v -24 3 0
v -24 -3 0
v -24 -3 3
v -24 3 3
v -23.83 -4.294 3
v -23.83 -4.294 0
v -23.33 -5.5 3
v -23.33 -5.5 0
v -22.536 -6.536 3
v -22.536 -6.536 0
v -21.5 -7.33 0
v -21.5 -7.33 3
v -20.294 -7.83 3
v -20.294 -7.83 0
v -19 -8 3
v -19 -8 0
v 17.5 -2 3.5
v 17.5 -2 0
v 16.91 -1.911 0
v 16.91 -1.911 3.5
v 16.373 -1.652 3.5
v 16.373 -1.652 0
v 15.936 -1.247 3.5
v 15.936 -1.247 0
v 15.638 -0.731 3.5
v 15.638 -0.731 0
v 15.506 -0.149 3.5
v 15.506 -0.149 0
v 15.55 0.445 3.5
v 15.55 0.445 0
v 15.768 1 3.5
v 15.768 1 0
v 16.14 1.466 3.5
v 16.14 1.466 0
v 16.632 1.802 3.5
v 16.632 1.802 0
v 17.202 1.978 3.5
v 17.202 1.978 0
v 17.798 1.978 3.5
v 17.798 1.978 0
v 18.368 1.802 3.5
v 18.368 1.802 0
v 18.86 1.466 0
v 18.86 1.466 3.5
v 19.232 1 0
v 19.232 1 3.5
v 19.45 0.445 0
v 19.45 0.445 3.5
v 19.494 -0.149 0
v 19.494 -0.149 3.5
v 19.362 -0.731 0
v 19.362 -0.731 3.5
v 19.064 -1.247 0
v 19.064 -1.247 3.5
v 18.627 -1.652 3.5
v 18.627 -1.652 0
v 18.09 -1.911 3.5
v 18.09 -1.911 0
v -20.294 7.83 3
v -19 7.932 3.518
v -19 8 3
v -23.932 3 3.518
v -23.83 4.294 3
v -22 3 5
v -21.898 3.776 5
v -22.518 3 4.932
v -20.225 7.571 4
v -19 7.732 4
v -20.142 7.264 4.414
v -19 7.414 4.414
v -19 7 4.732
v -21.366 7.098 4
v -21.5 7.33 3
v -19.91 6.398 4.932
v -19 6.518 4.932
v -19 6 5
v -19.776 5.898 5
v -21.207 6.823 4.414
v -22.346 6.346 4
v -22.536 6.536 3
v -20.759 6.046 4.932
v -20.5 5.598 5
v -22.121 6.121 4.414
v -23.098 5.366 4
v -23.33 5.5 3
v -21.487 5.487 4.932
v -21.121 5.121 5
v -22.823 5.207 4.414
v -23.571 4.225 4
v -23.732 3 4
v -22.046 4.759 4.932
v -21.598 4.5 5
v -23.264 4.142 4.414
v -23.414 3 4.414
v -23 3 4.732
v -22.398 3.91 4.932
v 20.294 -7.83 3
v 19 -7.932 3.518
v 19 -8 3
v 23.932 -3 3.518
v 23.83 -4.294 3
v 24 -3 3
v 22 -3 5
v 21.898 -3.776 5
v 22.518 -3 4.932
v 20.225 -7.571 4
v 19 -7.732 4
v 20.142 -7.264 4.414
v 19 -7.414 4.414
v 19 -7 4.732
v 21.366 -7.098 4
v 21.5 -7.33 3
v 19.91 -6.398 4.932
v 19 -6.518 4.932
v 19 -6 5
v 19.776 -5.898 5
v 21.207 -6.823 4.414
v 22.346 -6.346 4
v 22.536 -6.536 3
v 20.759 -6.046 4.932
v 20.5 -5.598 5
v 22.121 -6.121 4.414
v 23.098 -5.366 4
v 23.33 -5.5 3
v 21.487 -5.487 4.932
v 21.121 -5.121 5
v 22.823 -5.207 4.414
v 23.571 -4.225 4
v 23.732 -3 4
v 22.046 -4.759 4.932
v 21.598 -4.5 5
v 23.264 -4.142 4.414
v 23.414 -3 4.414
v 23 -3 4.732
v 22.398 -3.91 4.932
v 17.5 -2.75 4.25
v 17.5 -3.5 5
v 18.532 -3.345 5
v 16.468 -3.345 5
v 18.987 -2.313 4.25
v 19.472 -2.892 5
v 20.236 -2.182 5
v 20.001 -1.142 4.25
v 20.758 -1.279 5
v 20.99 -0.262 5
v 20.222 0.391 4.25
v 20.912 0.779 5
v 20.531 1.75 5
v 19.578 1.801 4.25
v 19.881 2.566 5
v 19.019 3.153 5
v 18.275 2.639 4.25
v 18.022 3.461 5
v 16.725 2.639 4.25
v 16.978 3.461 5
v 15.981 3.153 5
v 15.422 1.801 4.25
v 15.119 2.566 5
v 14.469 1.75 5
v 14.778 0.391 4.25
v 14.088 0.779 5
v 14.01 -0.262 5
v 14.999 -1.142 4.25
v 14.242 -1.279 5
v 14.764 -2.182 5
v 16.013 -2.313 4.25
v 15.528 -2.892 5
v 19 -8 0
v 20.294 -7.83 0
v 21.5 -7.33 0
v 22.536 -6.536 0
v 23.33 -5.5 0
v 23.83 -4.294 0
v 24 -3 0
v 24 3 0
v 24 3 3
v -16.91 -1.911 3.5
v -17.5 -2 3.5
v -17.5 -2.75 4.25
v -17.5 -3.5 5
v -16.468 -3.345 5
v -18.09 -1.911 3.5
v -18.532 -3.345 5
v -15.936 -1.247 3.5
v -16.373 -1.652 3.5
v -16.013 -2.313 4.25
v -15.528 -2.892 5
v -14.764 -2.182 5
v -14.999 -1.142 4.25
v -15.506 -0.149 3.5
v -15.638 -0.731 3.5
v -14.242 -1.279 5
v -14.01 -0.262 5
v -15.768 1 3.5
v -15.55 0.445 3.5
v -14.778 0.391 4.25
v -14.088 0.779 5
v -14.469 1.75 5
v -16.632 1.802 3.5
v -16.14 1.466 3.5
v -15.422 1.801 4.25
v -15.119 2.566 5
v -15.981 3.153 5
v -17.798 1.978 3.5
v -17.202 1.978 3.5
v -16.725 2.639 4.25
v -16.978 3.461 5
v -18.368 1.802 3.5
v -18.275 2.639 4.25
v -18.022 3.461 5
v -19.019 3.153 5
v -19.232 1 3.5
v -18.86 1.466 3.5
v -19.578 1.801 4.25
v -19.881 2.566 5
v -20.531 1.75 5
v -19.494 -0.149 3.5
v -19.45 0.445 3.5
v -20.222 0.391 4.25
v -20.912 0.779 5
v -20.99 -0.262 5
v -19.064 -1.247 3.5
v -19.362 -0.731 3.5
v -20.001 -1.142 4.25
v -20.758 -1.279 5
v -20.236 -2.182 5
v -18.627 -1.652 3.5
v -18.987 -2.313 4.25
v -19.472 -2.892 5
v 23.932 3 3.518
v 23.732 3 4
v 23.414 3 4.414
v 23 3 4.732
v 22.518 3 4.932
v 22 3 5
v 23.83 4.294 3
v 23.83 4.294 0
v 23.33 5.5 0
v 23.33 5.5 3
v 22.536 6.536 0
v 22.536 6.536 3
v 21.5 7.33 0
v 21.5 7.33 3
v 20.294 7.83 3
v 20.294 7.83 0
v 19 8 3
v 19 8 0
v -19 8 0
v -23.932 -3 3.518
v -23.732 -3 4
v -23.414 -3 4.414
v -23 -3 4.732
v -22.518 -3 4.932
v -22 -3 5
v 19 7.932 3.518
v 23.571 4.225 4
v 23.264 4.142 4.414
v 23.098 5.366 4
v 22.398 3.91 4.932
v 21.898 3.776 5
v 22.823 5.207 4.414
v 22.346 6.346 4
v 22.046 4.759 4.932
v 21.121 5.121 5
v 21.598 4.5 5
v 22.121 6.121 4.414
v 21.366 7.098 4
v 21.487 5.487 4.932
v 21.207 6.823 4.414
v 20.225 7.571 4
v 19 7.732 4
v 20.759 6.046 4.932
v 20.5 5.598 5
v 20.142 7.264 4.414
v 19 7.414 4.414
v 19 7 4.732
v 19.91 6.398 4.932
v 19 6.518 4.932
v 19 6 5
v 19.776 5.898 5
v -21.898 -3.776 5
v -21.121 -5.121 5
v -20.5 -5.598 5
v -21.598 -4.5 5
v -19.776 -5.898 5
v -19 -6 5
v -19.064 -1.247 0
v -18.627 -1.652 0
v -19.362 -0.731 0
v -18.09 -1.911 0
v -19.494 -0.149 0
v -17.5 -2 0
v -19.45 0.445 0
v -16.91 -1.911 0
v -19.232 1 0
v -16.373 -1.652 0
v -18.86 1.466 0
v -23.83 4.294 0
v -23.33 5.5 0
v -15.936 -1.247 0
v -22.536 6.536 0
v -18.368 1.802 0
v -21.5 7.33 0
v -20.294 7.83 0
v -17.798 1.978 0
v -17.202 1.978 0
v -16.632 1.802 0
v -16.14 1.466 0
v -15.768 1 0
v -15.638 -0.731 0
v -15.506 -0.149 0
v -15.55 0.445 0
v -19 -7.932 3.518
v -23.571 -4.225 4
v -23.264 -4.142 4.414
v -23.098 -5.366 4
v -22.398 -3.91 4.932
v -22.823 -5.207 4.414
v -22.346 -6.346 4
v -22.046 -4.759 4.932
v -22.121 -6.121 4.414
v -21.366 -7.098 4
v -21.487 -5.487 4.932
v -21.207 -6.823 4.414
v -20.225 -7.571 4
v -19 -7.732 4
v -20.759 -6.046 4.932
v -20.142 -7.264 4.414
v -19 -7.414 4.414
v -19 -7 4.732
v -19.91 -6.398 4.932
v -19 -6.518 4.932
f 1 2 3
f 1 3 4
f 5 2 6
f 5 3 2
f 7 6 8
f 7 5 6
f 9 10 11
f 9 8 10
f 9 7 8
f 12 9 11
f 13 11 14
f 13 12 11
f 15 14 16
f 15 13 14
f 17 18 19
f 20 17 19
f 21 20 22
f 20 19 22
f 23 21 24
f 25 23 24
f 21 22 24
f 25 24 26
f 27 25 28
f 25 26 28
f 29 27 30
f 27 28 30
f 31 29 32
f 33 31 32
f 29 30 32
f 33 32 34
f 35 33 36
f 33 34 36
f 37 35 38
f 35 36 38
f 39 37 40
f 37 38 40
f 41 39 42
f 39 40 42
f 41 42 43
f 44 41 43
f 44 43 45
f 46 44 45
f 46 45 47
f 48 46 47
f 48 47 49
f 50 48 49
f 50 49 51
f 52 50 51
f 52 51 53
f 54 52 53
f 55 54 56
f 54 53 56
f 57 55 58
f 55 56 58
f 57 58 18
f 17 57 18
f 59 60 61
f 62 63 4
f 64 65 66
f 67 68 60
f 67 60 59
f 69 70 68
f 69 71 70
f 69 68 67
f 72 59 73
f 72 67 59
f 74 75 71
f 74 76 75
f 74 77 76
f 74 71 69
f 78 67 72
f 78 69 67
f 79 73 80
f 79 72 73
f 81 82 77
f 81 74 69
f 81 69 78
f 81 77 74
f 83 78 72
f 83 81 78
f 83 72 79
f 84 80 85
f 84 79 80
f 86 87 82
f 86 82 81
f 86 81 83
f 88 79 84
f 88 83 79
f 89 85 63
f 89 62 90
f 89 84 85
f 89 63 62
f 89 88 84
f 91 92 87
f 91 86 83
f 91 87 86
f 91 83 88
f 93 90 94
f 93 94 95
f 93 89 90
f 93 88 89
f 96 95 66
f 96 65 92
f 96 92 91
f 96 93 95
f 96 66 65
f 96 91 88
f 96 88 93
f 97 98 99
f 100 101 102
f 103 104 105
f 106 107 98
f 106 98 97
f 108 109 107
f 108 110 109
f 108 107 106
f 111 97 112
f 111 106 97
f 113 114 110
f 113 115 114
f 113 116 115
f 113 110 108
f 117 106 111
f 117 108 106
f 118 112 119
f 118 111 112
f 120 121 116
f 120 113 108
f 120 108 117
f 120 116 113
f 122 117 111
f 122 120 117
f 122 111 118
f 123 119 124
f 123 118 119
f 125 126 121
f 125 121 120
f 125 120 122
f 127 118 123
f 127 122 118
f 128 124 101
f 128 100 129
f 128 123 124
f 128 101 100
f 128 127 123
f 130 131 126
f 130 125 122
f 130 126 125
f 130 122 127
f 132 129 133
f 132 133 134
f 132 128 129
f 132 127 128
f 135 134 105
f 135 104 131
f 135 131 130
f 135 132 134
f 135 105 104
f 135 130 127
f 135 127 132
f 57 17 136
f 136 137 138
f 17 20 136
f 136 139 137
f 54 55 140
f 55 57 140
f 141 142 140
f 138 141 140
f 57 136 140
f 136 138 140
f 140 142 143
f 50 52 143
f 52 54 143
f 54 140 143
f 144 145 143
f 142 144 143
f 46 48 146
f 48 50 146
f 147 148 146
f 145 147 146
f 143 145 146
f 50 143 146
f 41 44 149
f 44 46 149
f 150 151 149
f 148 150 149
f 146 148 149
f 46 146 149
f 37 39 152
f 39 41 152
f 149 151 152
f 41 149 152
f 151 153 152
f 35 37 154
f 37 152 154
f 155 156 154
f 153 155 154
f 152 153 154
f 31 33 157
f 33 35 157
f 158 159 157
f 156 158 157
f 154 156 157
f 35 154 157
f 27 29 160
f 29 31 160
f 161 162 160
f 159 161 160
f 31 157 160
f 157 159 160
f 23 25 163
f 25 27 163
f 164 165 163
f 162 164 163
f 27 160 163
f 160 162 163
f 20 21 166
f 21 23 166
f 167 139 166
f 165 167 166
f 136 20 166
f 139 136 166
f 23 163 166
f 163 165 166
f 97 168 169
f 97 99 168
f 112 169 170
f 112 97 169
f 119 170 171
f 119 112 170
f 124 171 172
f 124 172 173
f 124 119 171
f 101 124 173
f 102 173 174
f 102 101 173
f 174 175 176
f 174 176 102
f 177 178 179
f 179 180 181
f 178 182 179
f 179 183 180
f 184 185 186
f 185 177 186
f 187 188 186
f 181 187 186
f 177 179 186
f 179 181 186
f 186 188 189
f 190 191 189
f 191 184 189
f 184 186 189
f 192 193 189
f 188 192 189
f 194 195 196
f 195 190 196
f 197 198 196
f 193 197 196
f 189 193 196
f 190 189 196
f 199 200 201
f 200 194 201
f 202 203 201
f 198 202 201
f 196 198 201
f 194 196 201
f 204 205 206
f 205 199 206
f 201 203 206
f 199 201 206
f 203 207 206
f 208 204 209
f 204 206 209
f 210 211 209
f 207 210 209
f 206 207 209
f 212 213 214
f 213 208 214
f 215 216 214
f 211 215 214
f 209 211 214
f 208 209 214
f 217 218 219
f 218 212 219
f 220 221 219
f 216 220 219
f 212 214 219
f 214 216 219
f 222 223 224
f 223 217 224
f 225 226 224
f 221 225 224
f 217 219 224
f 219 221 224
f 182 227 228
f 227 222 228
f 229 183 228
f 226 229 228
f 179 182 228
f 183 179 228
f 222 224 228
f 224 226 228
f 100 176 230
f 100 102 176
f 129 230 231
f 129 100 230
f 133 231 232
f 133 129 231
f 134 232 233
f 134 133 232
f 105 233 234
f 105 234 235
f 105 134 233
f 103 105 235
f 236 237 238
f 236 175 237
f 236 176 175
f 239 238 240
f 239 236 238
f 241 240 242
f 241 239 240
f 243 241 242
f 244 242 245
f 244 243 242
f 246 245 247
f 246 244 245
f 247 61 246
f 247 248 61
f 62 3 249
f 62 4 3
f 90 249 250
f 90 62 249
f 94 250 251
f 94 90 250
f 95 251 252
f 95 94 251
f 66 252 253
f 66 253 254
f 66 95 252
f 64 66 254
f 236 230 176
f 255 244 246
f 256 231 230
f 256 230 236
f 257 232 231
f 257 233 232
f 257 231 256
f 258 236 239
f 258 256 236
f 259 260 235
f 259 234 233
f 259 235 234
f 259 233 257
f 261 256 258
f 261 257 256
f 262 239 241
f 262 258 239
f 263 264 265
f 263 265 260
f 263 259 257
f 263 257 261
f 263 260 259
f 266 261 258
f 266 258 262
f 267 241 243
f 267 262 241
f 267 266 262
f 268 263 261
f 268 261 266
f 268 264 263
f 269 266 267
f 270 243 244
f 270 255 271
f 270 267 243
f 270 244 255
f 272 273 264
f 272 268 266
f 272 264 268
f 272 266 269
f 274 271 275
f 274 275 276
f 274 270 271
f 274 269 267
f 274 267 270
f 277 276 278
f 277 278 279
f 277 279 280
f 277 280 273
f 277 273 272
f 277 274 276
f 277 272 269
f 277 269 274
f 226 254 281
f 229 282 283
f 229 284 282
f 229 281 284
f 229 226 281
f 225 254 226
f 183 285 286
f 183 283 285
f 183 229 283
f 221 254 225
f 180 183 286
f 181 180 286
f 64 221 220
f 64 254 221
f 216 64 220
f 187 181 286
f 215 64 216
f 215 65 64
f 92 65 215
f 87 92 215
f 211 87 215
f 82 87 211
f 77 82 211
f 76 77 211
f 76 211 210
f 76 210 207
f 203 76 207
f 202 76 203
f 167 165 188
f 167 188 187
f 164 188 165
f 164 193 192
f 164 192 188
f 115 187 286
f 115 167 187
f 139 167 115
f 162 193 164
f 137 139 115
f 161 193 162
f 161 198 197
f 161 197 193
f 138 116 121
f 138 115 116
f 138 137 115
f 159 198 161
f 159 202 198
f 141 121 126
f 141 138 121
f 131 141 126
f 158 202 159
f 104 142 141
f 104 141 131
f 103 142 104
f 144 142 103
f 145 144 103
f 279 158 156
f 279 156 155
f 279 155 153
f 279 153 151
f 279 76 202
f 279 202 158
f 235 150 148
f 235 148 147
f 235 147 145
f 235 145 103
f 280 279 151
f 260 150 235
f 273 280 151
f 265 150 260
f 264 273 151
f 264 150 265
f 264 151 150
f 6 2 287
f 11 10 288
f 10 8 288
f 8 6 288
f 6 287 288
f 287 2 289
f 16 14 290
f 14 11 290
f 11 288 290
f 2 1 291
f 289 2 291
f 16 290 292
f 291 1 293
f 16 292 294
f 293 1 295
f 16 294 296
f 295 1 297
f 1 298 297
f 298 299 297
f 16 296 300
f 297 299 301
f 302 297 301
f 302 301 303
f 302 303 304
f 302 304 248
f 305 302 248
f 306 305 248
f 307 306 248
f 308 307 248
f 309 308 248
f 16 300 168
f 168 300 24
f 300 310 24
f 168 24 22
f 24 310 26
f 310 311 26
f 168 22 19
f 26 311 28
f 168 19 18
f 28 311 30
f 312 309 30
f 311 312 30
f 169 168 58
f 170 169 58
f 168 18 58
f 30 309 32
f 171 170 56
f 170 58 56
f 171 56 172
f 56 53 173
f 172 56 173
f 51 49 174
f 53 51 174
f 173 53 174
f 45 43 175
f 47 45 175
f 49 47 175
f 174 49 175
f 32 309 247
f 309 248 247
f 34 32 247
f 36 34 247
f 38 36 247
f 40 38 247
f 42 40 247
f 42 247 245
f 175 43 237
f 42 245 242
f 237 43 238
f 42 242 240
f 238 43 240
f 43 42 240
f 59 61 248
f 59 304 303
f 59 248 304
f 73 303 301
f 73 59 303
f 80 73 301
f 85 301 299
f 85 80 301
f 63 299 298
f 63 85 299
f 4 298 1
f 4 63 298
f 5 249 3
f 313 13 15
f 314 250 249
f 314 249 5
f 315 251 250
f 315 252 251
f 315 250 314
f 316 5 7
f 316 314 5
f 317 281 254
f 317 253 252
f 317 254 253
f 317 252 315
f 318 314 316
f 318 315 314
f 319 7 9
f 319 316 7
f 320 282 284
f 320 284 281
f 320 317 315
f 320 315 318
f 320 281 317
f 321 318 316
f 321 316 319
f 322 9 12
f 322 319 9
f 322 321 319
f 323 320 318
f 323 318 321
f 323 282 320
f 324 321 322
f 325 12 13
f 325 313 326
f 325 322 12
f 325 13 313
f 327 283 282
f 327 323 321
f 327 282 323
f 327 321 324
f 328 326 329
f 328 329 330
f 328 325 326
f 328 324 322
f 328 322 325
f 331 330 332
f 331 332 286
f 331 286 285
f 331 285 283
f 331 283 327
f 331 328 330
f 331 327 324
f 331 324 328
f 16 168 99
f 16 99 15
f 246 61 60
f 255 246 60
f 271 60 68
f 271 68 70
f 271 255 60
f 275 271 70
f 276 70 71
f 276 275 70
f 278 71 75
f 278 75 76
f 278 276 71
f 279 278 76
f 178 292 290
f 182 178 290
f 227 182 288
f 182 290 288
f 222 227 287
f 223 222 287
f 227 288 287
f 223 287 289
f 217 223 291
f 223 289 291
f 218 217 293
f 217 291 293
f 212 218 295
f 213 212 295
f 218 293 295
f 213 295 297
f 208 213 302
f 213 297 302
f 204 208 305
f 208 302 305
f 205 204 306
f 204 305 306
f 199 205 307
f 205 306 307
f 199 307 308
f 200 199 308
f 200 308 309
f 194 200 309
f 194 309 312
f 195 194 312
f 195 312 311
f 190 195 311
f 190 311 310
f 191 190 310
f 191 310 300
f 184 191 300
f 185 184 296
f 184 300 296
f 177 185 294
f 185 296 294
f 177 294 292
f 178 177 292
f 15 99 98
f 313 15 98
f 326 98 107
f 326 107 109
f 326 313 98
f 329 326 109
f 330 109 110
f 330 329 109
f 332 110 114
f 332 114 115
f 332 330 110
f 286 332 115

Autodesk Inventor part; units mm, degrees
ref_plane "YZ Plane" through (0, 0, 0) normal (1, 0, 0) x (0, 1, 0)
ref_plane "XZ Plane" through (0, 0, 0) normal (0, 1, 0) x (-1, 0, 0)
ref_plane "XY Plane" through (0, 0, 0) normal (0, 0, 1) x (1, 0, 0)
sketch "Sketch1" plane through (0, 0, 0) normal (0, 0, 1) x (1, 0, 0)
  line L0 (24, -8) -> (-24, -8)
  line L1 (-24, -8) -> (-24, 8)
  line L2 (-24, 8) -> (24, 8)
  line L3 (24, 8) -> (24, -8)
  point P0 (0, 0)
  point P1 (-24, 0)
  point P2 (0, 8)
  dimension "d0" = 48
  dimension "d1" = 16
extrude "Extrusion1" add sketch "Sketch1" along normal blind 5
fillet "Fillet1" radius 5 4 edges at (-24, -8, 2.5) (-24, 8, 2.5) (24, -8, 2.5) (24, 8, 2.5)
fillet "Fillet2" radius 2 8 edges at (0, -8, 5) (-22.5355, -6.5355, 5) (-24, 0, 5) (-22.5355, 6.5355, 5) (0, 8, 5) (22.5355, 6.5355, 5) (24, 0, 5) (22.5355, -6.5355, 5)
sketch "Sketch2" plane through (0, 0, 5) normal (0, 0, 1) x (1, 0, 0)
  line L0 (19, -6) -> (-19, -6) projected
  line L1 (22, 3) -> (22, -3) projected
  line L2 (-19, 6) -> (19, 6) projected
  line L3 (-22, -3) -> (-22, 3) projected
  line L4 (-22, 0) -> (22, 0) construction
  line L5 (0, 6) -> (0, -6) construction
  point P0 (0, 0)
  point P1 (-17.5, 0)
  point P2 (17.5, 0)
  dimension "d6" = 35
hole "Hole1" at (-17.5, 0, 5) at (17.5, 0, 5) direction (0, 0, -1) diameter 4 end through all countersink diameter 7 countersink angle 90
properties part number "Support 48x16" material "ABS Plastic"
